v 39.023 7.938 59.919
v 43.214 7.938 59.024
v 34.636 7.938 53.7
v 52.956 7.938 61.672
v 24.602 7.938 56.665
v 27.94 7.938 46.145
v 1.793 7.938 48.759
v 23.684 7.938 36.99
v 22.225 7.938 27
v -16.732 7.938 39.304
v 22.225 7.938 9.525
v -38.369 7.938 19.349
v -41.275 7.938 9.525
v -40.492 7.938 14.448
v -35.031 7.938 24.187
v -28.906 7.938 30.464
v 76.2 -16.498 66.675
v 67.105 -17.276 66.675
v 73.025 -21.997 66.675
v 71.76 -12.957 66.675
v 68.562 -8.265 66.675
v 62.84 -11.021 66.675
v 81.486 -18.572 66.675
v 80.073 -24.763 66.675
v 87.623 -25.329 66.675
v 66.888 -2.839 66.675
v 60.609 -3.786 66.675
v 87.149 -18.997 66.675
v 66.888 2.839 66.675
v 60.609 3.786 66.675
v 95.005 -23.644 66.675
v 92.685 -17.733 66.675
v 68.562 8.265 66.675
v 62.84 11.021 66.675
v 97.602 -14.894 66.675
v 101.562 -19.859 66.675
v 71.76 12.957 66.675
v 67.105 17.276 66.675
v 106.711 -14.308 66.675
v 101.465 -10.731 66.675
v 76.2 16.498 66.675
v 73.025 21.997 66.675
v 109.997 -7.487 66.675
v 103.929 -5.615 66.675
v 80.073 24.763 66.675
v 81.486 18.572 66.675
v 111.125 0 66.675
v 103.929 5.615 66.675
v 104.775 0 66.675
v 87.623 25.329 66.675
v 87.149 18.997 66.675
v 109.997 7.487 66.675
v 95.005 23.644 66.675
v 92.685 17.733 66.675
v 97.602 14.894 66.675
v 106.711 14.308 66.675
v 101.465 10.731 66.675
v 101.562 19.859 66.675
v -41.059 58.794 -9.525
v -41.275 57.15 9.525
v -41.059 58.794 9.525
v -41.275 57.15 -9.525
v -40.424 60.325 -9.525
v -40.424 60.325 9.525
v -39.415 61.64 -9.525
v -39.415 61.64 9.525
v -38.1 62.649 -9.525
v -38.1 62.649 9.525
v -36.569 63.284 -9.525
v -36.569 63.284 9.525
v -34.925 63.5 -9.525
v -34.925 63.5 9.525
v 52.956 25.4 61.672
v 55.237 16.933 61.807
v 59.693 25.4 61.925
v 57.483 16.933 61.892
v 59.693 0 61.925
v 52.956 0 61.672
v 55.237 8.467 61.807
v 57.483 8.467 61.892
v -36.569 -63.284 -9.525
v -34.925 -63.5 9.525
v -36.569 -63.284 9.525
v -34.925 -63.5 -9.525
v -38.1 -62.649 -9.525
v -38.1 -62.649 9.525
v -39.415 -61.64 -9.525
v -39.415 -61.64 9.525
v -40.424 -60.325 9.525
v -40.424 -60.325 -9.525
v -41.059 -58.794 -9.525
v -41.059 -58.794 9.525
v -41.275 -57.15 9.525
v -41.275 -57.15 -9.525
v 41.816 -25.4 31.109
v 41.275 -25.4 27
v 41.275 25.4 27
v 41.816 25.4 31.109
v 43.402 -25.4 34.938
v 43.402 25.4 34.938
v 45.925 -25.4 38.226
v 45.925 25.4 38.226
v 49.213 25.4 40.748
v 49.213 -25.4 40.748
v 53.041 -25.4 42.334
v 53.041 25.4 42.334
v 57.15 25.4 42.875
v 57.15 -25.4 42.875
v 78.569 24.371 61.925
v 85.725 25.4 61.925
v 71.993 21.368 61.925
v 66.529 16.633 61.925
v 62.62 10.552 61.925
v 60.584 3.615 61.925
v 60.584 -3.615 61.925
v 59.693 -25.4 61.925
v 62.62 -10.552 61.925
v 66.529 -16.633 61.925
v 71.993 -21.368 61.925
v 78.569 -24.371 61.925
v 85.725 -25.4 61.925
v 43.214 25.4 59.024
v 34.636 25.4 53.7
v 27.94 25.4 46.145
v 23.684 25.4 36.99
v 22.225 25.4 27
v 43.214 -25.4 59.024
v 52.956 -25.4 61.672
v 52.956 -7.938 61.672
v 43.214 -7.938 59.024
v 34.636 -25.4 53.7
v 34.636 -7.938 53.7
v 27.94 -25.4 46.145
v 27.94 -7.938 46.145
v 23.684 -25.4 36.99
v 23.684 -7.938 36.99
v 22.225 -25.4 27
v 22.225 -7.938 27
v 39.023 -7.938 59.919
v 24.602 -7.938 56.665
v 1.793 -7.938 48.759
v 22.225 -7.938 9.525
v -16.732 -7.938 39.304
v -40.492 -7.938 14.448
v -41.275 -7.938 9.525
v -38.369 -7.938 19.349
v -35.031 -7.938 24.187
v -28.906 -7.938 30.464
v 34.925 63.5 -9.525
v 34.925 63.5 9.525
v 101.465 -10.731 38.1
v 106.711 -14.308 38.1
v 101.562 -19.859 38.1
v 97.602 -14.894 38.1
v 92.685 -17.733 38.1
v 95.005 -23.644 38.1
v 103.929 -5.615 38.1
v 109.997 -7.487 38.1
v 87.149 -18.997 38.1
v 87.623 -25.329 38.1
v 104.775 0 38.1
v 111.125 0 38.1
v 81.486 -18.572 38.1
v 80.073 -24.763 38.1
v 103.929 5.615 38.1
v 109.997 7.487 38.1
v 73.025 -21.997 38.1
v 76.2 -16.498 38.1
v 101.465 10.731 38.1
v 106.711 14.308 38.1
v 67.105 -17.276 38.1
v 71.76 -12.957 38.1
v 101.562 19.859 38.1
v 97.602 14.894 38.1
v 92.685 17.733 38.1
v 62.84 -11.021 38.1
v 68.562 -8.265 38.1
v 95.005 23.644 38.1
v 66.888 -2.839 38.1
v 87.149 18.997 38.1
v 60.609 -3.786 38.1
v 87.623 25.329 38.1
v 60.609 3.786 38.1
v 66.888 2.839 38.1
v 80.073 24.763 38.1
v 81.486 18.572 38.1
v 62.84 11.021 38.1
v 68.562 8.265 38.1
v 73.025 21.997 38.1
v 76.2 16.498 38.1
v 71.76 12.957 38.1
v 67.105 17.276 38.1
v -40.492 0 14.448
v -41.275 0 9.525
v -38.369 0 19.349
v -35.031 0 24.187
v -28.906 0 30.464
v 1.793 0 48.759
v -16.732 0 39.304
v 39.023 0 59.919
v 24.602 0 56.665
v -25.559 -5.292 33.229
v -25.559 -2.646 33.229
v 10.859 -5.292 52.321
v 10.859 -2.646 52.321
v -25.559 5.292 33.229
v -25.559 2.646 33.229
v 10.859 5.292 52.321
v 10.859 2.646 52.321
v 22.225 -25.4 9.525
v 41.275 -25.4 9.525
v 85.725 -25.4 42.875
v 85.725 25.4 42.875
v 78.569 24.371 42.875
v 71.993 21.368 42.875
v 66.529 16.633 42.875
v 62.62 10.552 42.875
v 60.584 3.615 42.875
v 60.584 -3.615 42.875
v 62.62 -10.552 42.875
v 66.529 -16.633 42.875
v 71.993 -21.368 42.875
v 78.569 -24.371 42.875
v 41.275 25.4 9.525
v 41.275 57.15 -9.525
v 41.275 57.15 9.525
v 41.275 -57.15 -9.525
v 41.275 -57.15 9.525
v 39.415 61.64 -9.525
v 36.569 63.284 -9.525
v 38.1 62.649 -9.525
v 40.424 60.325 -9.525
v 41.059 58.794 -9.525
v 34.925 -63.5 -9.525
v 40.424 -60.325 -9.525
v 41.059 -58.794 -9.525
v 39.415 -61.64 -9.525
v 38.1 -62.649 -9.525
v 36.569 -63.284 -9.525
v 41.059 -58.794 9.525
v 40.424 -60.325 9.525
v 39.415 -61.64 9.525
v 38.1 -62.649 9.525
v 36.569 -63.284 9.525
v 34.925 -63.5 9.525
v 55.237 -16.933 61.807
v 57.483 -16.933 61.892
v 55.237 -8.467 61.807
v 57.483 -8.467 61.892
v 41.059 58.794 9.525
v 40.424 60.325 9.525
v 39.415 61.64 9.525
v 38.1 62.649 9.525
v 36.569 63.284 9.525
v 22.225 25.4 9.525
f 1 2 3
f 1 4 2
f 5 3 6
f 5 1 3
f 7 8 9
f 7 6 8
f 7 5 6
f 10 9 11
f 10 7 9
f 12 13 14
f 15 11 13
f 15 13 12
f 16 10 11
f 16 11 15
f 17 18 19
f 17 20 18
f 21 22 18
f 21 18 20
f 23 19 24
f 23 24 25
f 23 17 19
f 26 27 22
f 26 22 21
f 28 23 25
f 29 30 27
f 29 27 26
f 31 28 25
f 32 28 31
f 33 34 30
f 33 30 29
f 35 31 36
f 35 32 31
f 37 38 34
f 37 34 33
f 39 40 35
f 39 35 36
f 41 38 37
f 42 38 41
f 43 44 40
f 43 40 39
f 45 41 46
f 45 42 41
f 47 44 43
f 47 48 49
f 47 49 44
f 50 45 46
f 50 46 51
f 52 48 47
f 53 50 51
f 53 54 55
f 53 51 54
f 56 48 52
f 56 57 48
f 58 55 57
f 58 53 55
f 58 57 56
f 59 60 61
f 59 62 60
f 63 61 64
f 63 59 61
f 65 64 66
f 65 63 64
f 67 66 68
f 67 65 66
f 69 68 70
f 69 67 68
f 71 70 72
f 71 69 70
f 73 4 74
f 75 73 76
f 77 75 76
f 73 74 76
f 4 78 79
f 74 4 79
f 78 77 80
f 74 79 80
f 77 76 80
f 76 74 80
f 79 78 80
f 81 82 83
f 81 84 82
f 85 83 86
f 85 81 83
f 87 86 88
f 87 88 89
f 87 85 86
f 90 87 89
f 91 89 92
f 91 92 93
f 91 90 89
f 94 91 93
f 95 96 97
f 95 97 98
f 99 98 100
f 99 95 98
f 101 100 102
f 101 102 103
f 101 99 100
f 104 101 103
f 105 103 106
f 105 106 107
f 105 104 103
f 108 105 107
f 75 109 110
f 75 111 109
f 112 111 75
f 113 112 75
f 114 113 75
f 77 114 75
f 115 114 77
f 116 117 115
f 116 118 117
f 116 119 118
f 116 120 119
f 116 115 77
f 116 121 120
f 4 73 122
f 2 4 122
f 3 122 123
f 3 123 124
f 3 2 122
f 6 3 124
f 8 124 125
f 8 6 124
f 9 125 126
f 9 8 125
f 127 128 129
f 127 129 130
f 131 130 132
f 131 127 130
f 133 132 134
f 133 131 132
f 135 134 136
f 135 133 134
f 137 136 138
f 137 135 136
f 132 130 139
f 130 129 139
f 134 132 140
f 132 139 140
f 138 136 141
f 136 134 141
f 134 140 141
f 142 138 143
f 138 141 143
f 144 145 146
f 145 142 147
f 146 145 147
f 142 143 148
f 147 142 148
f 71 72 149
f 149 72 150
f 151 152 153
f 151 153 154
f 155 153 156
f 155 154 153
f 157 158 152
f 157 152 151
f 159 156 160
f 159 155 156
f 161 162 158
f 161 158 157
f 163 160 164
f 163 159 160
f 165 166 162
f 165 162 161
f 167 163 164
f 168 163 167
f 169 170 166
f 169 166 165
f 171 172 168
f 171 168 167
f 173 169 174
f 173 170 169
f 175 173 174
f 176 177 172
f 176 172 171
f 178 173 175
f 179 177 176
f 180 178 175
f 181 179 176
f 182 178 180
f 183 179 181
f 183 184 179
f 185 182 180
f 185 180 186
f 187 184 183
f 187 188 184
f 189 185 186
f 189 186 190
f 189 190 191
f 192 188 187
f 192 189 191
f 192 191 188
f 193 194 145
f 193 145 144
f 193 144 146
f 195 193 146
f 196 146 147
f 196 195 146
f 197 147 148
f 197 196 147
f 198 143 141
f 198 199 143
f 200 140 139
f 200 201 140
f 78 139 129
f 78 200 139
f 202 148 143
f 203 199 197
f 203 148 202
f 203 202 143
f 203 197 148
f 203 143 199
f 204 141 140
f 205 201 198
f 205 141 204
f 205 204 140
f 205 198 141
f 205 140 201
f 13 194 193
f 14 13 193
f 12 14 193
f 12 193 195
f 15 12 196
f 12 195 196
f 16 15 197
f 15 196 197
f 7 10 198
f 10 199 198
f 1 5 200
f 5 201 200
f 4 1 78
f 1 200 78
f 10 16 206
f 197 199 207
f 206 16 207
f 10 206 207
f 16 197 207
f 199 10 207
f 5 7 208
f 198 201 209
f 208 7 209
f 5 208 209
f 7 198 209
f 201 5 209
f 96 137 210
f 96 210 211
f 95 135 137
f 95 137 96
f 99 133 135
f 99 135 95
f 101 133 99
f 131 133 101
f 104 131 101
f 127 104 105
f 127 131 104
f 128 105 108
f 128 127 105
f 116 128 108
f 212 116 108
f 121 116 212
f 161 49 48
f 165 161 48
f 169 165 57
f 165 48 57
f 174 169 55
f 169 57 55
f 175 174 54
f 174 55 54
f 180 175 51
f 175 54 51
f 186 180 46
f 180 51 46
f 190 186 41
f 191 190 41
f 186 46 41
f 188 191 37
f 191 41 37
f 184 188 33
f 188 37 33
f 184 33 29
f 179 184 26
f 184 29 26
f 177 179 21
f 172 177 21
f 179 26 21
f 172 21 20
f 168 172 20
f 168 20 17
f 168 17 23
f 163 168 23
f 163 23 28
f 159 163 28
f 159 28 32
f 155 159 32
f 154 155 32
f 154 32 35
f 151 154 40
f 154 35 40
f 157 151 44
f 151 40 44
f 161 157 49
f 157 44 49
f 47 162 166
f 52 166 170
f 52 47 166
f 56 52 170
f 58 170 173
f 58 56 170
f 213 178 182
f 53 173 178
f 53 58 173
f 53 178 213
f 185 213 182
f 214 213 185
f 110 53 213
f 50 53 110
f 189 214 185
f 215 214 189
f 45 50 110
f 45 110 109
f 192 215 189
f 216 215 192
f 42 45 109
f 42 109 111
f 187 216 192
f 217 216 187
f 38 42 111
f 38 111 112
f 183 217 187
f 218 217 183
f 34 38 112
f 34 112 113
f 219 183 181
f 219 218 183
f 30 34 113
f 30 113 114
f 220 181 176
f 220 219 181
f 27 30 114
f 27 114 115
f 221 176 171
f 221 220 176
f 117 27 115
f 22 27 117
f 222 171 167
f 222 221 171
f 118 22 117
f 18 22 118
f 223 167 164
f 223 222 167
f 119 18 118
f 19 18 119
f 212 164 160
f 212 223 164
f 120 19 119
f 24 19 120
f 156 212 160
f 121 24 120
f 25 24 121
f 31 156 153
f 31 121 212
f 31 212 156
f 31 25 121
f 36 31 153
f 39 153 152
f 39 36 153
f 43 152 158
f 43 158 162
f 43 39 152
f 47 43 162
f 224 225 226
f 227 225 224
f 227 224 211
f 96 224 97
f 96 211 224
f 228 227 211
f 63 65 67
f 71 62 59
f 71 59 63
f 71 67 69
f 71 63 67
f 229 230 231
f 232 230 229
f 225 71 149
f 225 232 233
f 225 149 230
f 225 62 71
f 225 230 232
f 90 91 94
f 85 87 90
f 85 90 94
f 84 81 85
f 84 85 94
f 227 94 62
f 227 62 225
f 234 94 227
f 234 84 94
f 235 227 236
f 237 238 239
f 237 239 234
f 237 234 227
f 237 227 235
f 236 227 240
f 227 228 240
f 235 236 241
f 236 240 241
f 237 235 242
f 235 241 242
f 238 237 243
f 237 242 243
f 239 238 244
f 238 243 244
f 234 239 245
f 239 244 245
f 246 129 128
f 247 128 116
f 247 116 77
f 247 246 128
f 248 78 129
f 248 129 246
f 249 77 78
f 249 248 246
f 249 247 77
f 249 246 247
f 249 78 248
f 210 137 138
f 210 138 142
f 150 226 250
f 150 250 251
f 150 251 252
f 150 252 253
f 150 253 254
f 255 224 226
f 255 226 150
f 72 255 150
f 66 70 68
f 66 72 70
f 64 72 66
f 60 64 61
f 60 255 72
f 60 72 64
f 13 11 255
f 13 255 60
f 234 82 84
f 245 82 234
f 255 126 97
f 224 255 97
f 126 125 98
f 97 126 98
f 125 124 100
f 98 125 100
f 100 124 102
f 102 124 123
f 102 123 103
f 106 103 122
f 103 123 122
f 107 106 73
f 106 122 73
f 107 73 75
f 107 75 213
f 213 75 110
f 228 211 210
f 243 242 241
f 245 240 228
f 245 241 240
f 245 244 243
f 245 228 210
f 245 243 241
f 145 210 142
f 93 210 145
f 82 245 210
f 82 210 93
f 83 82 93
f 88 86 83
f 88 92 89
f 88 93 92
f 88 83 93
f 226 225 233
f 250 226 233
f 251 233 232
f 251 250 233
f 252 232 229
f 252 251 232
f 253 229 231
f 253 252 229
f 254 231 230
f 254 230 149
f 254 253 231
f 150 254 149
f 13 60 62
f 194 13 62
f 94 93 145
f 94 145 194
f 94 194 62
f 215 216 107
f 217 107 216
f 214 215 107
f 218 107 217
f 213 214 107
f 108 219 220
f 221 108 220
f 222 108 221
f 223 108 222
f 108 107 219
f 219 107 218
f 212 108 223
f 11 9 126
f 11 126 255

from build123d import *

# Parameters (mm, degrees)
F1_DEPTH = 63.5
F0_W     = 25.4
F0_H     = 19.05
F2_DEPTH = 25.4
F3_DEPTH = 7.9375
F5_R     = 6.35
F6_R     = 19.05
F7_DEPTH = 28.575


with BuildPart() as f1:
    # F0 (on Front) → F1 (new body, symmetric)
    with BuildSketch(Plane.XZ):
        Polygon((22.225, 9.525), (-41.275, 9.525), (-41.275, -9.525), (41.275, -9.525), (41.275, 9.525), align=None)
    extrude(amount=F1_DEPTH, both=True)

    # F0 (on Front) → F2 (join, symmetric)
    with BuildSketch(Plane.XZ):
        with BuildLine():
            Line((22.225, 27.0002), (22.225, 9.525))
            Line((22.225, 9.525), (41.275, 9.525))
            Line((41.275, 9.525), (41.275, 27.0002))
            ThreePointArc((41.275, 27.0002), (45.9246798487, 38.2255201513), (57.15, 42.8752))
            Line((57.15, 42.8752), (60.325, 42.8752))
            Line((60.325, 42.8752), (60.325, 61.9252))
            Line((60.325, 61.9252), (59.6934049136, 61.9252))
            add(Edge.make_bspline(
                [(52.9561563715, 61.6724843294), (55.2525673411, 61.8319540941), (57.5026044371, 61.9176558632), (59.6934049136, 61.9252)],
                knots=[107.5361075689, 107.5361075689, 107.5361075689, 107.5361075689, 113.7209316461, 113.7209316461, 113.7209316461, 113.7209316461], degree=3))
            ThreePointArc((52.9561563715, 61.6724843294), (31.013573181, 50.165752403), (22.225, 27.0002))
        make_face()
        with Locations((73.025, 52.4002)):
            Rectangle(F0_W, F0_H)
    extrude(amount=F2_DEPTH, both=True)

    # F0 (on Front) → F3 (join, symmetric)
    with BuildSketch(Plane.XZ):
        with BuildLine():
            add(Edge.make_bspline(
                [(-41.275, 9.525), (-40.9189941995, 33.8261781517), (13.0282467061, 58.8997687996), (52.9561563715, 61.6724843294)],
                knots=[0, 0, 0, 0, 107.5361075689, 107.5361075689, 107.5361075689, 107.5361075689], degree=3))
            Line((-41.275, 9.525), (22.225, 9.525))
            Line((22.225, 9.525), (22.225, 27.0002))
            ThreePointArc((22.225, 27.0002), (31.013573181, 50.165752403), (52.9561563715, 61.6724843294))
        make_face()
    extrude(amount=F3_DEPTH, both=True)

    # F0 (on Front) → F4 (revolve)
    with BuildSketch(Plane.XZ):
        Polygon((85.725, 66.675), (85.725, 61.9252), (85.725, 42.8752), (85.725, 38.1), (111.125, 38.1), (111.125, 66.675), align=None)
    revolve(axis=Axis((85.725, 0, 52.3875), (0, 0, 1)))

    # F5
    f5_edges = [f1.edges().sort_by_distance(p)[0] for p in [
        (41.275, -63.5, 0),
        (-41.275, -63.5, 0),
        (41.275, 63.5, 0),
        (-41.275, 63.5, 0),
    ]]
    fillet(f5_edges, radius=F5_R)

    # F6 (on face) → F7 (cut, through all)
    with BuildSketch(Plane.XY.offset(66.675)):
        with Locations((85.725, 0)):
            Circle(F6_R)
    extrude(amount=-F7_DEPTH, mode=Mode.SUBTRACT)


solid = f1.part
